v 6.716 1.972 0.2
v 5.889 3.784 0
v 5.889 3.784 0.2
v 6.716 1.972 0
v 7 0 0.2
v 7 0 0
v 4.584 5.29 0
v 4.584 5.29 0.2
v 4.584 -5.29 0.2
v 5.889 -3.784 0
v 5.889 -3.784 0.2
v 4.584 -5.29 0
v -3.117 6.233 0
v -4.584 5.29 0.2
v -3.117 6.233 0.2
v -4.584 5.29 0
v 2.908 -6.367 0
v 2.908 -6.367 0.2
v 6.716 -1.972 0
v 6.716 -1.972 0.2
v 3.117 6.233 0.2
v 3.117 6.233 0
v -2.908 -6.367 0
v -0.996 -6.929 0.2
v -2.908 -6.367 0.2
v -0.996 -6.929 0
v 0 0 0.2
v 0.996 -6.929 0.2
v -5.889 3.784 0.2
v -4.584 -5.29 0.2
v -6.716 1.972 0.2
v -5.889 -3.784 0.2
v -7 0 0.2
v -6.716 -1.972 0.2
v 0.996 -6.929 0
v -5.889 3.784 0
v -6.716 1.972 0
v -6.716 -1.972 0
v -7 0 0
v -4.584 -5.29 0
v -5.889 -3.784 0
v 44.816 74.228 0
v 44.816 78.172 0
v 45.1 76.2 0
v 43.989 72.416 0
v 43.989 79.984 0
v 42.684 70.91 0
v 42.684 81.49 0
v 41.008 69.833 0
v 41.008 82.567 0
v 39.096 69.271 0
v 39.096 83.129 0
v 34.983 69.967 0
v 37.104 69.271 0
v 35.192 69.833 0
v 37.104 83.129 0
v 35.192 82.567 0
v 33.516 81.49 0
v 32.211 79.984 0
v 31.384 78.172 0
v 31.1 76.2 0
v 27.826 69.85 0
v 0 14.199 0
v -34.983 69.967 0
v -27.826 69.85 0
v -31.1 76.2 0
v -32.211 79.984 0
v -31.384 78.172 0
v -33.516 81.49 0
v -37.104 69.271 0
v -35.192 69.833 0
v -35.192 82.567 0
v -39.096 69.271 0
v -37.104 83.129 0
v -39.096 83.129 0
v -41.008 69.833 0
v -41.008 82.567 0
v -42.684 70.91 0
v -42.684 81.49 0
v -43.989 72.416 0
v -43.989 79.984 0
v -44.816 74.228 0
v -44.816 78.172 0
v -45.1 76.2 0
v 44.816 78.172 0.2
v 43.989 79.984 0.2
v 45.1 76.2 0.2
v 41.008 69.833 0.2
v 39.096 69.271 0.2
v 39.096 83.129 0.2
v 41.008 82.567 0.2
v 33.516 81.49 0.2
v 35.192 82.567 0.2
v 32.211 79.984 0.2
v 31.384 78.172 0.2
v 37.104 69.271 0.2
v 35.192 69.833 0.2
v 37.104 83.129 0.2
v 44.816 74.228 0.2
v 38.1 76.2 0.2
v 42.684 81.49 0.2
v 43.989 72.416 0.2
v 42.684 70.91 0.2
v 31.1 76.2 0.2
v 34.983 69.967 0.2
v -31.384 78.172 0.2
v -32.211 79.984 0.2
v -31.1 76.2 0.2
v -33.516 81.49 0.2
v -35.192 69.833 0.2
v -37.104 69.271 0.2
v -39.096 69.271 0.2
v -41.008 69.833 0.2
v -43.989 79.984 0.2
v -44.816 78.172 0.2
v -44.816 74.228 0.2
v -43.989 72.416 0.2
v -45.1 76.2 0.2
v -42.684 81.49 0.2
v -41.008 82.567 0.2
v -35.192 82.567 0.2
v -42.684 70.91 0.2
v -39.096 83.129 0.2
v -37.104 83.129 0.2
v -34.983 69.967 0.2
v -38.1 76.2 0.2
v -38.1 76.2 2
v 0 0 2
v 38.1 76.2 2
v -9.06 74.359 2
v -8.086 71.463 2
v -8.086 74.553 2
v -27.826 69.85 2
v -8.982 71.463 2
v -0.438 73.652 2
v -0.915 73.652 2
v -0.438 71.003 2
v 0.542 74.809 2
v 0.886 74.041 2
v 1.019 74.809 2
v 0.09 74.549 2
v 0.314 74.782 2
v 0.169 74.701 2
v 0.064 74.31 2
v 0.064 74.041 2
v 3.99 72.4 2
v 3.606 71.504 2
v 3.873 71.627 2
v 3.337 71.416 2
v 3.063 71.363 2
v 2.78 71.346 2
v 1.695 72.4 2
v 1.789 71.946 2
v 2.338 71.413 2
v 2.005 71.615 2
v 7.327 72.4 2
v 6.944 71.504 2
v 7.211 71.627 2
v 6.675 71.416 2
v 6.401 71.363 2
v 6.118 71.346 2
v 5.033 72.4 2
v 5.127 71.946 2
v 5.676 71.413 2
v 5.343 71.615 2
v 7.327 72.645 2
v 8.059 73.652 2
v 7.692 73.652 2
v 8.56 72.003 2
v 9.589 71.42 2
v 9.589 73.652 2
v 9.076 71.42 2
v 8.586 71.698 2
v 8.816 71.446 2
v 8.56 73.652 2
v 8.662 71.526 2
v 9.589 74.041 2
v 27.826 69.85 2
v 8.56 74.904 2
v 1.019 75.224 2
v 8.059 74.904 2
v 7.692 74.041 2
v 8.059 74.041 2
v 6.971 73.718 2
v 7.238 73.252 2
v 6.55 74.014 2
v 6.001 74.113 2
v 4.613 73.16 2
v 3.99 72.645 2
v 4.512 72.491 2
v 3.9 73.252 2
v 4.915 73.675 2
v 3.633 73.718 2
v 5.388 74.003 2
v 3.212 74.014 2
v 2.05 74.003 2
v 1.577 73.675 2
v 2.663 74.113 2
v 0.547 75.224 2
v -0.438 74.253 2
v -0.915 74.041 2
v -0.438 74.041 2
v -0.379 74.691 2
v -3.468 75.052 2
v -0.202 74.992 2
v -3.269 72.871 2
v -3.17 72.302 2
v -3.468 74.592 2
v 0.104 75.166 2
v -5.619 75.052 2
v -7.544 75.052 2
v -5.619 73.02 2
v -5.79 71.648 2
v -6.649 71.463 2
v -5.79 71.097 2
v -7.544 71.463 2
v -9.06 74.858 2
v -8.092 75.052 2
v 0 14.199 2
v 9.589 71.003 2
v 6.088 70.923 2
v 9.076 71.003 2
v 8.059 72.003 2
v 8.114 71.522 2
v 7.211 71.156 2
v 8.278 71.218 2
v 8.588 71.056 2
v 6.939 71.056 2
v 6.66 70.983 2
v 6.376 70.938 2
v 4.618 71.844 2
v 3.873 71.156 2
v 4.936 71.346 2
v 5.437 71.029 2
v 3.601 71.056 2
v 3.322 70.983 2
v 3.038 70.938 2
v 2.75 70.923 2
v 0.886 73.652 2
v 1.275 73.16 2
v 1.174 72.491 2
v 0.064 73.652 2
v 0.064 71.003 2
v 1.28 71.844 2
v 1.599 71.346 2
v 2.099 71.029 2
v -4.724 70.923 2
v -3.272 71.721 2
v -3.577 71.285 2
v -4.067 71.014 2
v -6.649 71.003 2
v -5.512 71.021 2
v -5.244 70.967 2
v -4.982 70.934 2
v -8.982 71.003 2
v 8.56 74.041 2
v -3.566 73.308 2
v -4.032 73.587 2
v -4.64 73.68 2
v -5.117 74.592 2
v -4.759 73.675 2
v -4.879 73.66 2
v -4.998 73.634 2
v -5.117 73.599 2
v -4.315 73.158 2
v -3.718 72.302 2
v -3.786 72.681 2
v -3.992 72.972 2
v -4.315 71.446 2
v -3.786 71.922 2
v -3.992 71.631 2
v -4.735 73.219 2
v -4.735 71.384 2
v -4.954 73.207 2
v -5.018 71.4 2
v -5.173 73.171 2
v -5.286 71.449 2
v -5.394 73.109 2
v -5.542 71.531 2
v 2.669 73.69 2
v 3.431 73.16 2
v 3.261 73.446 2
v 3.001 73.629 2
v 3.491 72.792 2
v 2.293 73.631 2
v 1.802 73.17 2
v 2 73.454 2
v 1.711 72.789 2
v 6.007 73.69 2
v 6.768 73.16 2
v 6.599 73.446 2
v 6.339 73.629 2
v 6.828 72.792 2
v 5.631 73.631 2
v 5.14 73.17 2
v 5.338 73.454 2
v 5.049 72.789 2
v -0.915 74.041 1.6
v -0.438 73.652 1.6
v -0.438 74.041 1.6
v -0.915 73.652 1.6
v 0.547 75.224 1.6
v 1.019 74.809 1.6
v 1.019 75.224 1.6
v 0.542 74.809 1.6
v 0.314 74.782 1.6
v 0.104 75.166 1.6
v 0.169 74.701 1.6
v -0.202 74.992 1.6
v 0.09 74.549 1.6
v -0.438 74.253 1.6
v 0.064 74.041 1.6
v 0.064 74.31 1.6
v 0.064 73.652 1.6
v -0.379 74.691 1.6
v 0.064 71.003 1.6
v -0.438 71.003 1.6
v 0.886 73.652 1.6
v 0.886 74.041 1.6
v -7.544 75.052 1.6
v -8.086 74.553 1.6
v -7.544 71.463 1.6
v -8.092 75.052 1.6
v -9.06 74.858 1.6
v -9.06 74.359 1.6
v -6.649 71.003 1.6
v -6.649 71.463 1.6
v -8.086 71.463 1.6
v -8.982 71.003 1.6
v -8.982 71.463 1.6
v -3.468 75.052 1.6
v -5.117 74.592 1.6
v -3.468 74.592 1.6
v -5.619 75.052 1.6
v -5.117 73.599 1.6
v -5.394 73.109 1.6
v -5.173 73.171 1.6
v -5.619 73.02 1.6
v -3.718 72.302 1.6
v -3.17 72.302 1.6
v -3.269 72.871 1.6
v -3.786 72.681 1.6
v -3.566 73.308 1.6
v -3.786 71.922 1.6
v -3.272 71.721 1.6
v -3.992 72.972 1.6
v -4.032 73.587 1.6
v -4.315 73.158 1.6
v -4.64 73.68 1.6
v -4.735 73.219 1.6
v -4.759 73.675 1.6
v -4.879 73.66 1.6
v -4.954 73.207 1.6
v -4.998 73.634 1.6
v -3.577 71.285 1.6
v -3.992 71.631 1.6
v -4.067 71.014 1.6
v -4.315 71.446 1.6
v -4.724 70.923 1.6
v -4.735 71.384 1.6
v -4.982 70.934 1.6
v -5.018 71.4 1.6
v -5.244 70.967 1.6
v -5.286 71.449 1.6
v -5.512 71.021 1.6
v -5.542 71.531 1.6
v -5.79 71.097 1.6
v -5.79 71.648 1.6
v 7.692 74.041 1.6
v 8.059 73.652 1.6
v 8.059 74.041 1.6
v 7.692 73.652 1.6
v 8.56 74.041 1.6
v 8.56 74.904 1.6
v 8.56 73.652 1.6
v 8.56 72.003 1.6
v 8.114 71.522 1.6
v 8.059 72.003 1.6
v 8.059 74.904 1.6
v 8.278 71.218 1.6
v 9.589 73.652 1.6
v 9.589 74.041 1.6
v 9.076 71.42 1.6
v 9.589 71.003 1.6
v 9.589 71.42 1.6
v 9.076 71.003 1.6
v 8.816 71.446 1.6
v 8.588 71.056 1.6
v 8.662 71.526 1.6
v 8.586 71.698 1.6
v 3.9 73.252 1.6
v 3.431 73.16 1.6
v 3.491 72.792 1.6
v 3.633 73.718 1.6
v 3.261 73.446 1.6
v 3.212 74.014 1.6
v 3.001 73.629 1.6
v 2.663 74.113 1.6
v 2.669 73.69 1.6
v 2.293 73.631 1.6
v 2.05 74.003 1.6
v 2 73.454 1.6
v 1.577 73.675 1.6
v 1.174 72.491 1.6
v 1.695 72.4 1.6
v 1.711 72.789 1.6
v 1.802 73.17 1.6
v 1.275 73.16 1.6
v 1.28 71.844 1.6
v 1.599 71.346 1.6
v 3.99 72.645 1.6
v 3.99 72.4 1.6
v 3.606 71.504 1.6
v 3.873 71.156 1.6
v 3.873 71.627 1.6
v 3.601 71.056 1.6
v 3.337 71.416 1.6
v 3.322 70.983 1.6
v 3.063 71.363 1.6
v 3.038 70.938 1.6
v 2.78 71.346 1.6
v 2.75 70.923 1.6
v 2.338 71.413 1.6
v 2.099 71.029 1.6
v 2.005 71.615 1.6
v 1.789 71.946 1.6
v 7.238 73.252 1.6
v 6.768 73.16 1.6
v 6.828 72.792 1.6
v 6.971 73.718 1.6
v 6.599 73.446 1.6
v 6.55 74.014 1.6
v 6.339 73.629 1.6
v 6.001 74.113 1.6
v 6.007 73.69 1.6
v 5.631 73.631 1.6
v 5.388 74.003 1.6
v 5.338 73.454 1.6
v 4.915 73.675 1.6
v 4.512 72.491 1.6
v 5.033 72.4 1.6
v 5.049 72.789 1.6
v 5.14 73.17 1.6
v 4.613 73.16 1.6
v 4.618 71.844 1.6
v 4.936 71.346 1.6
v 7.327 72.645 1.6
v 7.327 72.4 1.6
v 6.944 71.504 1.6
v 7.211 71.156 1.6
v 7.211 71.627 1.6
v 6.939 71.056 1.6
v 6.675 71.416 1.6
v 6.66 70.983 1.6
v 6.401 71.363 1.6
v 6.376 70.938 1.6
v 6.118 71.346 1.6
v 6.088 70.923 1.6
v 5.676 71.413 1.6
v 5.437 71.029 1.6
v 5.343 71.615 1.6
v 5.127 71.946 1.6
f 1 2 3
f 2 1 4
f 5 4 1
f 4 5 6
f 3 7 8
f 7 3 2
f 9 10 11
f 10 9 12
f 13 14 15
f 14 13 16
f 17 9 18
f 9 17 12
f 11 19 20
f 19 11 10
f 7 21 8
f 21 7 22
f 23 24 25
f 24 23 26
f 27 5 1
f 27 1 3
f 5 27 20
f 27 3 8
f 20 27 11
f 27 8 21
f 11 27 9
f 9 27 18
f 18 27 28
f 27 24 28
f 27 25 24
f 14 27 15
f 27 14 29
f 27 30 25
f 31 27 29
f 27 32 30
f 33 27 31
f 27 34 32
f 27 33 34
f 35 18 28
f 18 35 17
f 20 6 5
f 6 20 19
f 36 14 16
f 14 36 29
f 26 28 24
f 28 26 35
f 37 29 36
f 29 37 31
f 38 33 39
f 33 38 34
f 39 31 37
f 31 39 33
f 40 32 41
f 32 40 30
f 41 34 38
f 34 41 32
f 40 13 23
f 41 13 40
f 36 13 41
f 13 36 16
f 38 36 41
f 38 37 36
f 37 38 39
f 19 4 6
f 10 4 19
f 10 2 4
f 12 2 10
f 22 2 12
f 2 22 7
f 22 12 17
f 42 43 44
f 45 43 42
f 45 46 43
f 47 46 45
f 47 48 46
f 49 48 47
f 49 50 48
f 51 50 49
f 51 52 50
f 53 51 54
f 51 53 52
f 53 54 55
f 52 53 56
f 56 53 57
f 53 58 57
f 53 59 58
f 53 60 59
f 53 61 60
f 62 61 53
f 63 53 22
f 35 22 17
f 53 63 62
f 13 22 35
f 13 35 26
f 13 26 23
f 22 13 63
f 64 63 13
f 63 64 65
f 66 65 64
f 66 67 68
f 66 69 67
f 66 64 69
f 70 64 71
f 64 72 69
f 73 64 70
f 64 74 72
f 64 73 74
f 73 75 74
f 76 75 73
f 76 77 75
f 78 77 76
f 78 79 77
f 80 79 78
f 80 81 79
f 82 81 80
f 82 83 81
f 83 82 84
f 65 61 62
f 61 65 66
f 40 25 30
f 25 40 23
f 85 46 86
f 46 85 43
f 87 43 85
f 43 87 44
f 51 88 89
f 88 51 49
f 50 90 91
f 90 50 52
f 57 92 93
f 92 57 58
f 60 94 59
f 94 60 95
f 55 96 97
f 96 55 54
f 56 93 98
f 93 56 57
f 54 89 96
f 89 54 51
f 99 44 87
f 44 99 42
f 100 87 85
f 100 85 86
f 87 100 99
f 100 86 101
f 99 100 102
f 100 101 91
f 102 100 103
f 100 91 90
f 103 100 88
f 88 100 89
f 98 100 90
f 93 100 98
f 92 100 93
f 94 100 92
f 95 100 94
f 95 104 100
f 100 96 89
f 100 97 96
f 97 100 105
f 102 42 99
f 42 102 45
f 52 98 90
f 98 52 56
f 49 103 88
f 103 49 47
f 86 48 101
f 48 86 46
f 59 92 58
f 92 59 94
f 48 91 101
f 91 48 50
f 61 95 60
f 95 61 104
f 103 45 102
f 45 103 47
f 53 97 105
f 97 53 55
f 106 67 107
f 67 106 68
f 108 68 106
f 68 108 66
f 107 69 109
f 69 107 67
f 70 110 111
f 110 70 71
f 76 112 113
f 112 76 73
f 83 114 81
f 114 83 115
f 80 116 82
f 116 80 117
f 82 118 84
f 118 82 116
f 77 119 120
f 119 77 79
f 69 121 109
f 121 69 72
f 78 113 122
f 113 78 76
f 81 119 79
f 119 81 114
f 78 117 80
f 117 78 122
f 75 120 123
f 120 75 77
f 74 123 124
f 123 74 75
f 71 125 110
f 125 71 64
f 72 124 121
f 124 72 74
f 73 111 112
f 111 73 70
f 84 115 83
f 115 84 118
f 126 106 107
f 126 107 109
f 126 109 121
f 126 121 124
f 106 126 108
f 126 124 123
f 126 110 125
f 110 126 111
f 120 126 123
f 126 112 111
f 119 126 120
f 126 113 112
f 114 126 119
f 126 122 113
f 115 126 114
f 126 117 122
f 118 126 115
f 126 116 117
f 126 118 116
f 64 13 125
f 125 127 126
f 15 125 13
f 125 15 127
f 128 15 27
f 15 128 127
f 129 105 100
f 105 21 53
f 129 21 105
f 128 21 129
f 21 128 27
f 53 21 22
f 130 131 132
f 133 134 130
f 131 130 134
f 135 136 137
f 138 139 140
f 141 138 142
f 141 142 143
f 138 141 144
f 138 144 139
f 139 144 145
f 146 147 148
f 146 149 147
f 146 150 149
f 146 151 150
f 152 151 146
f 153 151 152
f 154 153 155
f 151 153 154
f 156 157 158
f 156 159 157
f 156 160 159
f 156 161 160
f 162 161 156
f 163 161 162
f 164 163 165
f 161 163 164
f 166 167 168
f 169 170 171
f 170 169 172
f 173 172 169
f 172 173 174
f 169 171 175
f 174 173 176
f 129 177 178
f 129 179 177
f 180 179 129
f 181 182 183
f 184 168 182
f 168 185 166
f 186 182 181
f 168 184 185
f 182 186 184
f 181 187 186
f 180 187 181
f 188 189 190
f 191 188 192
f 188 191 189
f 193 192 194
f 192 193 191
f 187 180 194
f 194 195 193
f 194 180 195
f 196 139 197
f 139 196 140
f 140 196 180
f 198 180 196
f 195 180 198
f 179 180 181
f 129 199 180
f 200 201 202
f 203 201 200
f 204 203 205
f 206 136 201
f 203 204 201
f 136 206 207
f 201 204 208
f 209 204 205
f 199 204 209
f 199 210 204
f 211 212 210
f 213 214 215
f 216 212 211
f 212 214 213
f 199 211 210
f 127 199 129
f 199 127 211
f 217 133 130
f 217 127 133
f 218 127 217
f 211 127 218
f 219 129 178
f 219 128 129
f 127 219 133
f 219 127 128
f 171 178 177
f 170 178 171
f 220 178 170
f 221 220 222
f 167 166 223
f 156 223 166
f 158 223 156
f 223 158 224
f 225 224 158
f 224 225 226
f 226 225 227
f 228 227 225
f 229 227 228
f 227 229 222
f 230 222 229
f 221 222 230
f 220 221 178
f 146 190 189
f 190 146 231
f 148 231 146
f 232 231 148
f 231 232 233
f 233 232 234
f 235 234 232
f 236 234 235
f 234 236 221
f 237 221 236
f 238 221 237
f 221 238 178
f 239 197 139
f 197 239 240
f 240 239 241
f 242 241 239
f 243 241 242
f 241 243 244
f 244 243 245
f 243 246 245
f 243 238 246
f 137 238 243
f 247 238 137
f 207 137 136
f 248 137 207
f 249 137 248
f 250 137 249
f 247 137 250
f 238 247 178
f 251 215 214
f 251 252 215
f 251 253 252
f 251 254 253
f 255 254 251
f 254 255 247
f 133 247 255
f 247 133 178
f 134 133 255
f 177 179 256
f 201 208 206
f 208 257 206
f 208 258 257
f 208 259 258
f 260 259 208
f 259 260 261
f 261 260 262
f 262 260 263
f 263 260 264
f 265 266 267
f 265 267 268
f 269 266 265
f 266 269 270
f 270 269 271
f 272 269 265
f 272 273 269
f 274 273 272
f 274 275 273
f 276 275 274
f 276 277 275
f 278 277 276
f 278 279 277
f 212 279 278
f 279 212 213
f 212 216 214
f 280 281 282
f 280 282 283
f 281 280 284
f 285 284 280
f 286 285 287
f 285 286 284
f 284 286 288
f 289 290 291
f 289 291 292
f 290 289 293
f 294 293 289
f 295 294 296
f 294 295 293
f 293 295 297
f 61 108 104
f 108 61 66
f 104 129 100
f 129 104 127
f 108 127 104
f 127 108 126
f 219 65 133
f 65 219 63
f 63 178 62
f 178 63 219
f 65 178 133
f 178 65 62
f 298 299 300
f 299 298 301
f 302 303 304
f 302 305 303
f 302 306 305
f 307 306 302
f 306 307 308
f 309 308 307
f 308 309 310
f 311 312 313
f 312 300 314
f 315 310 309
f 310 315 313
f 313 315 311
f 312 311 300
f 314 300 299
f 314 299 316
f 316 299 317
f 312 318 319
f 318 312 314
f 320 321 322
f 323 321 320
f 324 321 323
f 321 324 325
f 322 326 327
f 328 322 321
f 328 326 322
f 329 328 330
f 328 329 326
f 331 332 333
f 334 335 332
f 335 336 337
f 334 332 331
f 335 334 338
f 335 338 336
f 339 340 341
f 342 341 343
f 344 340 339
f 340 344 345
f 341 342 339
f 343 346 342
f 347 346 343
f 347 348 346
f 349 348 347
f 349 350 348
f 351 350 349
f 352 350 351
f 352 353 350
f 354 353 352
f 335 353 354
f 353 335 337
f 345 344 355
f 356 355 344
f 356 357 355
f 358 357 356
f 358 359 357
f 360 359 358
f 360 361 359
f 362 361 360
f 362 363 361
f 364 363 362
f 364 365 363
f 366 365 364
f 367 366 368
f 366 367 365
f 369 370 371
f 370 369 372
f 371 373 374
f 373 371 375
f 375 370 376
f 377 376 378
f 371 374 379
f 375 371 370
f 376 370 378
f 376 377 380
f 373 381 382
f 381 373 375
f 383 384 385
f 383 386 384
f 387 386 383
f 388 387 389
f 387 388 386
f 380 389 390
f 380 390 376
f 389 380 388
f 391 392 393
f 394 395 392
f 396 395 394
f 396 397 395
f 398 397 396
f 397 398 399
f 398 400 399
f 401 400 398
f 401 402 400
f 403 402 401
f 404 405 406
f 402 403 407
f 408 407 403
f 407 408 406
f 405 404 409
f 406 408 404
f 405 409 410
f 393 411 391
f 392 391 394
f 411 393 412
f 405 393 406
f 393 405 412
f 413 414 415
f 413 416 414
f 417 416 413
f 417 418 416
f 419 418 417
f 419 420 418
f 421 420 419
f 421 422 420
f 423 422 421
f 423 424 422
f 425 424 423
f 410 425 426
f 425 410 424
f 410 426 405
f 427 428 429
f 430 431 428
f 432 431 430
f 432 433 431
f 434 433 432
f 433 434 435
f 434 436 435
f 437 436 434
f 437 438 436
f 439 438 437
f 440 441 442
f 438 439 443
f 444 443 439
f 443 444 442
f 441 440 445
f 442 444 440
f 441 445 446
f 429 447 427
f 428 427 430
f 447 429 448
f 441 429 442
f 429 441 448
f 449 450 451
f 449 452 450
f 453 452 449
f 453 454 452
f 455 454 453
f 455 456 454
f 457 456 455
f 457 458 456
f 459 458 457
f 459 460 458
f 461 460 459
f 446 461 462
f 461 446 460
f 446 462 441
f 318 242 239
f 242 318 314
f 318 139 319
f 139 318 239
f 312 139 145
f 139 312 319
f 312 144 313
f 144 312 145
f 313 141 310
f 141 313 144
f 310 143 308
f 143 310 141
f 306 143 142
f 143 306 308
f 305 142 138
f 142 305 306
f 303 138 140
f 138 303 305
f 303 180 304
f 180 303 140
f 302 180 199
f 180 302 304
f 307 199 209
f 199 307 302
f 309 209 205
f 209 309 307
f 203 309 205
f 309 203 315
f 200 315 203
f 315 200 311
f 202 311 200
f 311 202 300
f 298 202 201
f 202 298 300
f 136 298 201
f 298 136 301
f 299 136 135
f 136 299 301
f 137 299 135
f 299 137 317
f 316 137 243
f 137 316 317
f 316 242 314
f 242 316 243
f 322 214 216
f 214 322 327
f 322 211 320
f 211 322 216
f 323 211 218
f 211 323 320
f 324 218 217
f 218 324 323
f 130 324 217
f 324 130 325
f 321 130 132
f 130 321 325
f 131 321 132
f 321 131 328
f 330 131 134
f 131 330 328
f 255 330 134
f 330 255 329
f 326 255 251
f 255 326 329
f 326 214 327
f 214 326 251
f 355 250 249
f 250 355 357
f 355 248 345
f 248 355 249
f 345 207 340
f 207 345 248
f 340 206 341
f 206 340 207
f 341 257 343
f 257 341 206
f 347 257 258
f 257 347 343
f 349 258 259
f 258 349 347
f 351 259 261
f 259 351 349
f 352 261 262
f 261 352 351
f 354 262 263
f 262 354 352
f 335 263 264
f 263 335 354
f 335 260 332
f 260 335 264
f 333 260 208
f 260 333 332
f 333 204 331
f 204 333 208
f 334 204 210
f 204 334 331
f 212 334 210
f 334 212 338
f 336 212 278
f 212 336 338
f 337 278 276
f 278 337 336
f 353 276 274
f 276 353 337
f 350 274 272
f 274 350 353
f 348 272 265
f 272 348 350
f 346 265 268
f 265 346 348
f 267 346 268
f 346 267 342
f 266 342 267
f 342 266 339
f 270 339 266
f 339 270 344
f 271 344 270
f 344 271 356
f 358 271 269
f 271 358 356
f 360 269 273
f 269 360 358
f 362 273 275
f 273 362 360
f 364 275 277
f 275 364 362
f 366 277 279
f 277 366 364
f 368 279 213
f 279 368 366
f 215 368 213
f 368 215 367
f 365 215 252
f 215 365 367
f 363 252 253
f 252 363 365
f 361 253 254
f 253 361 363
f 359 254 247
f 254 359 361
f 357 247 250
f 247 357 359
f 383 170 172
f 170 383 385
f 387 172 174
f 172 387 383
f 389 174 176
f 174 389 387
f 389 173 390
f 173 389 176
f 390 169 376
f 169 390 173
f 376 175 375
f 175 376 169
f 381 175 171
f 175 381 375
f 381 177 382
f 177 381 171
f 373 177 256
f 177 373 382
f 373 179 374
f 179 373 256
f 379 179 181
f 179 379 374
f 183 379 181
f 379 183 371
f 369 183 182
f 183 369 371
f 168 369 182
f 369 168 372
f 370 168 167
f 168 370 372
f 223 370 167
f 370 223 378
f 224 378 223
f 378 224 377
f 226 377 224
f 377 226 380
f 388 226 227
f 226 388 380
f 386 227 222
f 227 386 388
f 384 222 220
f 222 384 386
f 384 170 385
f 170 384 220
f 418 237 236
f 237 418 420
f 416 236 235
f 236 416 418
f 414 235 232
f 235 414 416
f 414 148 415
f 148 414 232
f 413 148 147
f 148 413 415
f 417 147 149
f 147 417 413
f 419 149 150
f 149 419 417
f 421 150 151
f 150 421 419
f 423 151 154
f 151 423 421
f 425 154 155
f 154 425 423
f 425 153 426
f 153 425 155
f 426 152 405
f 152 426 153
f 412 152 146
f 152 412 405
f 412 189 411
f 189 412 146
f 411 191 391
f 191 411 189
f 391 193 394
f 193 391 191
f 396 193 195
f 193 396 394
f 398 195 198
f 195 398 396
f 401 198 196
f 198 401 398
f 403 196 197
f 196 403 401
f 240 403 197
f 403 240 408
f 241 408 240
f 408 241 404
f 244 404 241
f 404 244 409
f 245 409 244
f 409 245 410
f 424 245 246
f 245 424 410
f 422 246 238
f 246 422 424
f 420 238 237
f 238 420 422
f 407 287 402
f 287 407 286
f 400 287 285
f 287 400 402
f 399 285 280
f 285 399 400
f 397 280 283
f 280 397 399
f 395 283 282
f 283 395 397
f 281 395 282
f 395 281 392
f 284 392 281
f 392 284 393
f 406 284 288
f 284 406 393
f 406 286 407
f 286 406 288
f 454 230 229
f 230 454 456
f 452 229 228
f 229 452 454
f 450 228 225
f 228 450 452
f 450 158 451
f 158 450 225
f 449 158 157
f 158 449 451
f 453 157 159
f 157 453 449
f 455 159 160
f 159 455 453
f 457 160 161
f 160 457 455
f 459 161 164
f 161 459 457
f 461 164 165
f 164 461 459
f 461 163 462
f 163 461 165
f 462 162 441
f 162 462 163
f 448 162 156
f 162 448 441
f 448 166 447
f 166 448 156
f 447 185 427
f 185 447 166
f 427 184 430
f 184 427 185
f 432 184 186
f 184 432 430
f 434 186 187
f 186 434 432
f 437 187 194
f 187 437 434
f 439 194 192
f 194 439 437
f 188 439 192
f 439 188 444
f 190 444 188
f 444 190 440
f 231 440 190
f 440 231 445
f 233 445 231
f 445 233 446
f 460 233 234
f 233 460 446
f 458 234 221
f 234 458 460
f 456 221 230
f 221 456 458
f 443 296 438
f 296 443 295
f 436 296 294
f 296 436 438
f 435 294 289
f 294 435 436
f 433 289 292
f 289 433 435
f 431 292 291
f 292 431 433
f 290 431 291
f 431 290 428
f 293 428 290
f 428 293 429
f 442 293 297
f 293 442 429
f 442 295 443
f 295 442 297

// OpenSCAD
epsilon=0.01;

layer=0.2;

// Convert inches to millimeters
inch = 25.4;
base = 3 * inch;     // 76.2 mm
height = 3 * inch;   // 76.2 mm
thickness = 2;       // mm

module mouse_ear() {
  cylinder(r=7,h=layer);
}

module pirata(s,size=8,valign="baseline") {
  text(s, font = "Pirata One", halign = "center", size=size, valign=valign);
}

default_label_thickness = 0.4;  // for incised/recessed labels

module negative_label(s, size=10, valign="baseline") {
  // place 3D label at origin at default thickness plus a lot
  // (meant to be subtracted from a solid)
  thickness = default_label_thickness+epsilon;
  linear_extrude(thickness+1)
    pirata(s, size=size, valign=valign);
}




// Define the 2D triangle shape (isosceles, flat base)
module dnd_cone(distance,thickness=2,ears=true) { // distance in feet
  base = distance / 5 * inch;
  height = base;
  linear_extrude(height=thickness)
  polygon(points=[
     [0,0], // apex
     [-base/2, height],                  // left base corner
     [base/2, height]
  ]);

  if (ears) {
    mouse_ear();
    translate([base/2,height,0]) mouse_ear();
    translate([-base/2,height,0]) mouse_ear();
  }
}

difference() {
  dnd_cone(15);
  small_in_inches = 3 - (0.5 + 1.118)/2;
  // total height is 3 inches, minus half an inch, minus 1.118 inches
  translate([0,1.118*inch/2,-epsilon])
    dnd_cone(15*small_in_inches/3,thickness=3,ears=false);
  translate([0,height-inch/8,thickness-default_label_thickness])
    negative_label("15 feet",size=4,valign="center");  


}
